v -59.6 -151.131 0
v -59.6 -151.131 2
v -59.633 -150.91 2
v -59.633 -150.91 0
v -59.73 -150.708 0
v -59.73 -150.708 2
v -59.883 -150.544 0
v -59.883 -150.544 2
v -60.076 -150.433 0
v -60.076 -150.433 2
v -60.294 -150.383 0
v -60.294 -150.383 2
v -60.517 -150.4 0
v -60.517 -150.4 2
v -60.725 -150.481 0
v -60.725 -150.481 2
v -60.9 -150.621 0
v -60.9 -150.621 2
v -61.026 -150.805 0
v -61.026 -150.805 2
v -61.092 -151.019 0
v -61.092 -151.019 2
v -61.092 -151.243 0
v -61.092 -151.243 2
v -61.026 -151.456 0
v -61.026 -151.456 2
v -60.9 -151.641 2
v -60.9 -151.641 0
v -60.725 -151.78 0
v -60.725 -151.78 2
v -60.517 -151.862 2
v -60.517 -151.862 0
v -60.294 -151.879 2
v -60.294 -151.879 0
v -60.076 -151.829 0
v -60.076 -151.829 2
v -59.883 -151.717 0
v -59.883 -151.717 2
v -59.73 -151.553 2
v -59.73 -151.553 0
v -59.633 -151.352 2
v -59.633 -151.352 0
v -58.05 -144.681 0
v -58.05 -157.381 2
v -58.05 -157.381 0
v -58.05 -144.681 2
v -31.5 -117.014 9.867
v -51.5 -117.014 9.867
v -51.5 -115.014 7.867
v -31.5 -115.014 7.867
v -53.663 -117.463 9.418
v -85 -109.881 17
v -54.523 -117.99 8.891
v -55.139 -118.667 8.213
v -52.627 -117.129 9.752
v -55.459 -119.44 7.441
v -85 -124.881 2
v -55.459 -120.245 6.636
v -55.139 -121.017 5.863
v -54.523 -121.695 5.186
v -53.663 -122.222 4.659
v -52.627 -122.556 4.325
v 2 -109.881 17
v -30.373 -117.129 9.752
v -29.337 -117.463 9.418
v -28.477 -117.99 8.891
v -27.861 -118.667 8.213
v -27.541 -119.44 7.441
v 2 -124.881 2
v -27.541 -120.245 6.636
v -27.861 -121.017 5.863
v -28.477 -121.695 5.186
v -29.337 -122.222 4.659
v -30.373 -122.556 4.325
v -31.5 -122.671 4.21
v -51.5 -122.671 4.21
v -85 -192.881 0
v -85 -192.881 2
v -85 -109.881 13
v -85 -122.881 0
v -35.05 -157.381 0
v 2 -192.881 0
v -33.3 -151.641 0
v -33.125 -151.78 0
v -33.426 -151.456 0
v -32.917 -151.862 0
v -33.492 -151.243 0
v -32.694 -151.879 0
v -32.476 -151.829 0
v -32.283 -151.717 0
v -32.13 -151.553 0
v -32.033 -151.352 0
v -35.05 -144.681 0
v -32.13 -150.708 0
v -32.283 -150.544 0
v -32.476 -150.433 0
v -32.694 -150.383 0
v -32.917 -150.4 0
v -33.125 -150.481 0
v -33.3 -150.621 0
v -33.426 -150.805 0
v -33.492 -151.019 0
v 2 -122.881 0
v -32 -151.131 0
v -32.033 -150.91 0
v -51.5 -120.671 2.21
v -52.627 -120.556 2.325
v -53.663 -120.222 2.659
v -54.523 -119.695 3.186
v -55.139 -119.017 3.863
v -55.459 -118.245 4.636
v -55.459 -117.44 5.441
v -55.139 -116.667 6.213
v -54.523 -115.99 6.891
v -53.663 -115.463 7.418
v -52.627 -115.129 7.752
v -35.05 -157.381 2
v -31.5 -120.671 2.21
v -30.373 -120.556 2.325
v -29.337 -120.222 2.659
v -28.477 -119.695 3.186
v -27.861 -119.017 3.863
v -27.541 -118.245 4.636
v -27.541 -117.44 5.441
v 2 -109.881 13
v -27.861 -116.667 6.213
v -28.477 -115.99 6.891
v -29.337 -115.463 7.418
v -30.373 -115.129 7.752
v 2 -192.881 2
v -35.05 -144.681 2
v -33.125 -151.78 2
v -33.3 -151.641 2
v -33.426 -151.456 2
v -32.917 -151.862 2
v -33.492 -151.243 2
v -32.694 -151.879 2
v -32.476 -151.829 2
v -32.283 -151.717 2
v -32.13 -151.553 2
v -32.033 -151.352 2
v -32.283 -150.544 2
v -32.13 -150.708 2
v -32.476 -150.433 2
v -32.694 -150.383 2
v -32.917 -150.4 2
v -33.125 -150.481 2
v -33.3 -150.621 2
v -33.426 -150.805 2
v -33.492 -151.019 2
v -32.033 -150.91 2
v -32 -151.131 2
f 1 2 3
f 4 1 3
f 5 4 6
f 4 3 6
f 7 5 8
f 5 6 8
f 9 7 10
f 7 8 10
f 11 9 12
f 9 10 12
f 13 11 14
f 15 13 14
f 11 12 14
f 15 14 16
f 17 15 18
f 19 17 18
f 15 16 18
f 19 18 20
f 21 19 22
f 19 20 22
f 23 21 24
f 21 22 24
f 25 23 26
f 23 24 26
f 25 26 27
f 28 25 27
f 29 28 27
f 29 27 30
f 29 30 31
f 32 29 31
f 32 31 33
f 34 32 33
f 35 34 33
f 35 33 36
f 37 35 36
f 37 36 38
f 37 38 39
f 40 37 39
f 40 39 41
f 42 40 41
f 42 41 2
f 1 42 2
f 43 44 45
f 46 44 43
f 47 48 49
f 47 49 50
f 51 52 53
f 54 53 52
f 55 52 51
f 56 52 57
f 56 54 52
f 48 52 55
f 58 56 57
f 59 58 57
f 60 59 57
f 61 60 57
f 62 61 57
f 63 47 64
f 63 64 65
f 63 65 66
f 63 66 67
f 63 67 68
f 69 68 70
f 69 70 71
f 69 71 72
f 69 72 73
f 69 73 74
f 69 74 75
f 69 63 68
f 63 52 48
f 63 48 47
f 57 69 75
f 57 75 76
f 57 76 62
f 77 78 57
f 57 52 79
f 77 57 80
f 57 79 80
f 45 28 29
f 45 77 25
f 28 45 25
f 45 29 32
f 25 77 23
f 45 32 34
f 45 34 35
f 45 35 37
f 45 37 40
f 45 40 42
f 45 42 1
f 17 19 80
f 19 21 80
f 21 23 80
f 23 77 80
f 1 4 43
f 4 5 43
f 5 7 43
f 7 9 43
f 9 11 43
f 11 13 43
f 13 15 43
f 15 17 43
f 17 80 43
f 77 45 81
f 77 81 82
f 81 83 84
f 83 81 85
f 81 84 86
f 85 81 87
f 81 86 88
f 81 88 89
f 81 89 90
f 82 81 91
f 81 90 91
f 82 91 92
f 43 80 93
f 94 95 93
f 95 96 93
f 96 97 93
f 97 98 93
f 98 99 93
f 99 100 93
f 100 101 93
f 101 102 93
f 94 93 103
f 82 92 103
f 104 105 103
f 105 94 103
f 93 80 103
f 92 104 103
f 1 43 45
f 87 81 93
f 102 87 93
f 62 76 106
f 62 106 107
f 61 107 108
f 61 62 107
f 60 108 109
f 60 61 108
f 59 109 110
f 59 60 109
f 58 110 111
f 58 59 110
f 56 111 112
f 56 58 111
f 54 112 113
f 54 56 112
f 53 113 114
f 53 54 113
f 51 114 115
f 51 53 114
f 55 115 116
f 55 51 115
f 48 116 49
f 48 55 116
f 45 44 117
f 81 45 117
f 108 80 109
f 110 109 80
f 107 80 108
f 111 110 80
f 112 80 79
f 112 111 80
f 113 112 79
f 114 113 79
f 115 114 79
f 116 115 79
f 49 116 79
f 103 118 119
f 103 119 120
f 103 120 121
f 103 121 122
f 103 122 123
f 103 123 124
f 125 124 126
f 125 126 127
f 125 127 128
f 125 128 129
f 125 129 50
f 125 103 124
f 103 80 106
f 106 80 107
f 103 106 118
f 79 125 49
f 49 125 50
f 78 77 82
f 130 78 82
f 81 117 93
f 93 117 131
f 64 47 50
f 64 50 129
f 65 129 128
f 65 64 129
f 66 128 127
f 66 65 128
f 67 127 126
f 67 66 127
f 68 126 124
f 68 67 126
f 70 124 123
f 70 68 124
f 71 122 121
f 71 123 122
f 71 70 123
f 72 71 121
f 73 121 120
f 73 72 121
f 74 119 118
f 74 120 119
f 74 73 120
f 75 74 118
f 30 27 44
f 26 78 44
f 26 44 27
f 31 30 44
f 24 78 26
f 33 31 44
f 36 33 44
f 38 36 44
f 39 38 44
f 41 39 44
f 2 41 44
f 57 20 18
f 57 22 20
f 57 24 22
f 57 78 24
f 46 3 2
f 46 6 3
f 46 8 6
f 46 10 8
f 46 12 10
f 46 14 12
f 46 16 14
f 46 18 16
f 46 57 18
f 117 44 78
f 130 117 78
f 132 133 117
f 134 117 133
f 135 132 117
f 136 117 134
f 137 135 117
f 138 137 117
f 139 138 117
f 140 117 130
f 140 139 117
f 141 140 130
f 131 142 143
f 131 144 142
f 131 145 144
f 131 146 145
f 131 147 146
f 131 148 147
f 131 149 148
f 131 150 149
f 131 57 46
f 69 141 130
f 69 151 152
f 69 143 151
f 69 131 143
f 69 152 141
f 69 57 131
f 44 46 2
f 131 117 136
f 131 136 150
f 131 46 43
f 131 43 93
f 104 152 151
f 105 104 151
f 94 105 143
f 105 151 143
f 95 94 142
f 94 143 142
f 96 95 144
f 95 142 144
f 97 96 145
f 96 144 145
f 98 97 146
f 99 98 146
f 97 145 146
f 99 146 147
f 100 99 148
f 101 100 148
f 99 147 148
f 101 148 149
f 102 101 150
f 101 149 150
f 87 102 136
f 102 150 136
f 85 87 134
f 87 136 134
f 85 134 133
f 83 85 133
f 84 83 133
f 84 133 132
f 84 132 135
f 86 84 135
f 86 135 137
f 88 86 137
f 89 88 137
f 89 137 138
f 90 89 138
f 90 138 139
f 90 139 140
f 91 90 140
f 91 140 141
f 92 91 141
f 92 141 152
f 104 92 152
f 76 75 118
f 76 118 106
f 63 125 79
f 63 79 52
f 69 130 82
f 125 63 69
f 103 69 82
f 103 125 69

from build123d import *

# Parameters (mm, degrees)
SKETCH_1_W          = 87
SKETCH_1_H          = 70
EXTRUDE_1_DEPTH     = 2
EXTRUDE_2_DEPTH     = 87
SKETCH_6_W          = 23
SKETCH_6_H          = 12.7
CUT_EXTRUDE_1_DEPTH = 15
SKETCH_7_R          = 0.75
CUT_EXTRUDE_2_DEPTH = 15
CUT_EXTRUDE_3_DEPTH = 5


with BuildPart() as part:
    # 草图1 → 凸台-拉伸1 (new body)
    with BuildSketch(Plane.XY):
        with Locations((-41.5, -157.880838162)):
            Rectangle(SKETCH_1_W, SKETCH_1_H)
    extrude(amount=EXTRUDE_1_DEPTH)

    # 草图3 → 凸台-拉伸2 (add)
    with BuildSketch(Plane(origin=(2, 0, 0), x_dir=(0, 0, -1), z_dir=(1, 0, 0))):
        Polygon((-17, -109.880838162), (-2, -124.880838162), (0, -122.880838162), (-13, -109.880838162), align=None)
    extrude(amount=-EXTRUDE_2_DEPTH)

    # 草图6 → 切除-拉伸1 (cut)
    with BuildSketch(Plane.XY.offset(2)):
        with Locations((-46.550124355, -151.030838162)):
            Rectangle(SKETCH_6_W, SKETCH_6_H)
    extrude(amount=-CUT_EXTRUDE_1_DEPTH, mode=Mode.SUBTRACT)

    # 草图7 → 切除-拉伸2 (cut)
    with BuildSketch(Plane.XY.offset(2)):
        with Locations((-32.750124355, -151.130838162)):
            Circle(SKETCH_7_R)
        with Locations((-60.350124355, -151.130838162)):
            Circle(SKETCH_7_R)
    extrude(amount=-CUT_EXTRUDE_2_DEPTH, mode=Mode.SUBTRACT)

    # 草图8 → 切除-拉伸3 (cut)
    with BuildSketch(Plane(origin=(0, -63.440419081, 63.440419081), x_dir=(1, 0, 0), z_dir=(0, -0.707106781186556, 0.7071067811865391))):
        with BuildLine():
            Line((-51.5, -75.764432966), (-31.5, -75.764432966))
            ThreePointArc((-31.5, -75.764432966), (-27.5, -79.764432966), (-31.5, -83.764432966))
            Line((-31.5, -83.764432966), (-51.5, -83.764432966))
            ThreePointArc((-51.5, -83.764432966), (-55.5, -79.764432966), (-51.5, -75.764432966))
        make_face()
    extrude(amount=-CUT_EXTRUDE_3_DEPTH, mode=Mode.SUBTRACT)


solid = part.part
